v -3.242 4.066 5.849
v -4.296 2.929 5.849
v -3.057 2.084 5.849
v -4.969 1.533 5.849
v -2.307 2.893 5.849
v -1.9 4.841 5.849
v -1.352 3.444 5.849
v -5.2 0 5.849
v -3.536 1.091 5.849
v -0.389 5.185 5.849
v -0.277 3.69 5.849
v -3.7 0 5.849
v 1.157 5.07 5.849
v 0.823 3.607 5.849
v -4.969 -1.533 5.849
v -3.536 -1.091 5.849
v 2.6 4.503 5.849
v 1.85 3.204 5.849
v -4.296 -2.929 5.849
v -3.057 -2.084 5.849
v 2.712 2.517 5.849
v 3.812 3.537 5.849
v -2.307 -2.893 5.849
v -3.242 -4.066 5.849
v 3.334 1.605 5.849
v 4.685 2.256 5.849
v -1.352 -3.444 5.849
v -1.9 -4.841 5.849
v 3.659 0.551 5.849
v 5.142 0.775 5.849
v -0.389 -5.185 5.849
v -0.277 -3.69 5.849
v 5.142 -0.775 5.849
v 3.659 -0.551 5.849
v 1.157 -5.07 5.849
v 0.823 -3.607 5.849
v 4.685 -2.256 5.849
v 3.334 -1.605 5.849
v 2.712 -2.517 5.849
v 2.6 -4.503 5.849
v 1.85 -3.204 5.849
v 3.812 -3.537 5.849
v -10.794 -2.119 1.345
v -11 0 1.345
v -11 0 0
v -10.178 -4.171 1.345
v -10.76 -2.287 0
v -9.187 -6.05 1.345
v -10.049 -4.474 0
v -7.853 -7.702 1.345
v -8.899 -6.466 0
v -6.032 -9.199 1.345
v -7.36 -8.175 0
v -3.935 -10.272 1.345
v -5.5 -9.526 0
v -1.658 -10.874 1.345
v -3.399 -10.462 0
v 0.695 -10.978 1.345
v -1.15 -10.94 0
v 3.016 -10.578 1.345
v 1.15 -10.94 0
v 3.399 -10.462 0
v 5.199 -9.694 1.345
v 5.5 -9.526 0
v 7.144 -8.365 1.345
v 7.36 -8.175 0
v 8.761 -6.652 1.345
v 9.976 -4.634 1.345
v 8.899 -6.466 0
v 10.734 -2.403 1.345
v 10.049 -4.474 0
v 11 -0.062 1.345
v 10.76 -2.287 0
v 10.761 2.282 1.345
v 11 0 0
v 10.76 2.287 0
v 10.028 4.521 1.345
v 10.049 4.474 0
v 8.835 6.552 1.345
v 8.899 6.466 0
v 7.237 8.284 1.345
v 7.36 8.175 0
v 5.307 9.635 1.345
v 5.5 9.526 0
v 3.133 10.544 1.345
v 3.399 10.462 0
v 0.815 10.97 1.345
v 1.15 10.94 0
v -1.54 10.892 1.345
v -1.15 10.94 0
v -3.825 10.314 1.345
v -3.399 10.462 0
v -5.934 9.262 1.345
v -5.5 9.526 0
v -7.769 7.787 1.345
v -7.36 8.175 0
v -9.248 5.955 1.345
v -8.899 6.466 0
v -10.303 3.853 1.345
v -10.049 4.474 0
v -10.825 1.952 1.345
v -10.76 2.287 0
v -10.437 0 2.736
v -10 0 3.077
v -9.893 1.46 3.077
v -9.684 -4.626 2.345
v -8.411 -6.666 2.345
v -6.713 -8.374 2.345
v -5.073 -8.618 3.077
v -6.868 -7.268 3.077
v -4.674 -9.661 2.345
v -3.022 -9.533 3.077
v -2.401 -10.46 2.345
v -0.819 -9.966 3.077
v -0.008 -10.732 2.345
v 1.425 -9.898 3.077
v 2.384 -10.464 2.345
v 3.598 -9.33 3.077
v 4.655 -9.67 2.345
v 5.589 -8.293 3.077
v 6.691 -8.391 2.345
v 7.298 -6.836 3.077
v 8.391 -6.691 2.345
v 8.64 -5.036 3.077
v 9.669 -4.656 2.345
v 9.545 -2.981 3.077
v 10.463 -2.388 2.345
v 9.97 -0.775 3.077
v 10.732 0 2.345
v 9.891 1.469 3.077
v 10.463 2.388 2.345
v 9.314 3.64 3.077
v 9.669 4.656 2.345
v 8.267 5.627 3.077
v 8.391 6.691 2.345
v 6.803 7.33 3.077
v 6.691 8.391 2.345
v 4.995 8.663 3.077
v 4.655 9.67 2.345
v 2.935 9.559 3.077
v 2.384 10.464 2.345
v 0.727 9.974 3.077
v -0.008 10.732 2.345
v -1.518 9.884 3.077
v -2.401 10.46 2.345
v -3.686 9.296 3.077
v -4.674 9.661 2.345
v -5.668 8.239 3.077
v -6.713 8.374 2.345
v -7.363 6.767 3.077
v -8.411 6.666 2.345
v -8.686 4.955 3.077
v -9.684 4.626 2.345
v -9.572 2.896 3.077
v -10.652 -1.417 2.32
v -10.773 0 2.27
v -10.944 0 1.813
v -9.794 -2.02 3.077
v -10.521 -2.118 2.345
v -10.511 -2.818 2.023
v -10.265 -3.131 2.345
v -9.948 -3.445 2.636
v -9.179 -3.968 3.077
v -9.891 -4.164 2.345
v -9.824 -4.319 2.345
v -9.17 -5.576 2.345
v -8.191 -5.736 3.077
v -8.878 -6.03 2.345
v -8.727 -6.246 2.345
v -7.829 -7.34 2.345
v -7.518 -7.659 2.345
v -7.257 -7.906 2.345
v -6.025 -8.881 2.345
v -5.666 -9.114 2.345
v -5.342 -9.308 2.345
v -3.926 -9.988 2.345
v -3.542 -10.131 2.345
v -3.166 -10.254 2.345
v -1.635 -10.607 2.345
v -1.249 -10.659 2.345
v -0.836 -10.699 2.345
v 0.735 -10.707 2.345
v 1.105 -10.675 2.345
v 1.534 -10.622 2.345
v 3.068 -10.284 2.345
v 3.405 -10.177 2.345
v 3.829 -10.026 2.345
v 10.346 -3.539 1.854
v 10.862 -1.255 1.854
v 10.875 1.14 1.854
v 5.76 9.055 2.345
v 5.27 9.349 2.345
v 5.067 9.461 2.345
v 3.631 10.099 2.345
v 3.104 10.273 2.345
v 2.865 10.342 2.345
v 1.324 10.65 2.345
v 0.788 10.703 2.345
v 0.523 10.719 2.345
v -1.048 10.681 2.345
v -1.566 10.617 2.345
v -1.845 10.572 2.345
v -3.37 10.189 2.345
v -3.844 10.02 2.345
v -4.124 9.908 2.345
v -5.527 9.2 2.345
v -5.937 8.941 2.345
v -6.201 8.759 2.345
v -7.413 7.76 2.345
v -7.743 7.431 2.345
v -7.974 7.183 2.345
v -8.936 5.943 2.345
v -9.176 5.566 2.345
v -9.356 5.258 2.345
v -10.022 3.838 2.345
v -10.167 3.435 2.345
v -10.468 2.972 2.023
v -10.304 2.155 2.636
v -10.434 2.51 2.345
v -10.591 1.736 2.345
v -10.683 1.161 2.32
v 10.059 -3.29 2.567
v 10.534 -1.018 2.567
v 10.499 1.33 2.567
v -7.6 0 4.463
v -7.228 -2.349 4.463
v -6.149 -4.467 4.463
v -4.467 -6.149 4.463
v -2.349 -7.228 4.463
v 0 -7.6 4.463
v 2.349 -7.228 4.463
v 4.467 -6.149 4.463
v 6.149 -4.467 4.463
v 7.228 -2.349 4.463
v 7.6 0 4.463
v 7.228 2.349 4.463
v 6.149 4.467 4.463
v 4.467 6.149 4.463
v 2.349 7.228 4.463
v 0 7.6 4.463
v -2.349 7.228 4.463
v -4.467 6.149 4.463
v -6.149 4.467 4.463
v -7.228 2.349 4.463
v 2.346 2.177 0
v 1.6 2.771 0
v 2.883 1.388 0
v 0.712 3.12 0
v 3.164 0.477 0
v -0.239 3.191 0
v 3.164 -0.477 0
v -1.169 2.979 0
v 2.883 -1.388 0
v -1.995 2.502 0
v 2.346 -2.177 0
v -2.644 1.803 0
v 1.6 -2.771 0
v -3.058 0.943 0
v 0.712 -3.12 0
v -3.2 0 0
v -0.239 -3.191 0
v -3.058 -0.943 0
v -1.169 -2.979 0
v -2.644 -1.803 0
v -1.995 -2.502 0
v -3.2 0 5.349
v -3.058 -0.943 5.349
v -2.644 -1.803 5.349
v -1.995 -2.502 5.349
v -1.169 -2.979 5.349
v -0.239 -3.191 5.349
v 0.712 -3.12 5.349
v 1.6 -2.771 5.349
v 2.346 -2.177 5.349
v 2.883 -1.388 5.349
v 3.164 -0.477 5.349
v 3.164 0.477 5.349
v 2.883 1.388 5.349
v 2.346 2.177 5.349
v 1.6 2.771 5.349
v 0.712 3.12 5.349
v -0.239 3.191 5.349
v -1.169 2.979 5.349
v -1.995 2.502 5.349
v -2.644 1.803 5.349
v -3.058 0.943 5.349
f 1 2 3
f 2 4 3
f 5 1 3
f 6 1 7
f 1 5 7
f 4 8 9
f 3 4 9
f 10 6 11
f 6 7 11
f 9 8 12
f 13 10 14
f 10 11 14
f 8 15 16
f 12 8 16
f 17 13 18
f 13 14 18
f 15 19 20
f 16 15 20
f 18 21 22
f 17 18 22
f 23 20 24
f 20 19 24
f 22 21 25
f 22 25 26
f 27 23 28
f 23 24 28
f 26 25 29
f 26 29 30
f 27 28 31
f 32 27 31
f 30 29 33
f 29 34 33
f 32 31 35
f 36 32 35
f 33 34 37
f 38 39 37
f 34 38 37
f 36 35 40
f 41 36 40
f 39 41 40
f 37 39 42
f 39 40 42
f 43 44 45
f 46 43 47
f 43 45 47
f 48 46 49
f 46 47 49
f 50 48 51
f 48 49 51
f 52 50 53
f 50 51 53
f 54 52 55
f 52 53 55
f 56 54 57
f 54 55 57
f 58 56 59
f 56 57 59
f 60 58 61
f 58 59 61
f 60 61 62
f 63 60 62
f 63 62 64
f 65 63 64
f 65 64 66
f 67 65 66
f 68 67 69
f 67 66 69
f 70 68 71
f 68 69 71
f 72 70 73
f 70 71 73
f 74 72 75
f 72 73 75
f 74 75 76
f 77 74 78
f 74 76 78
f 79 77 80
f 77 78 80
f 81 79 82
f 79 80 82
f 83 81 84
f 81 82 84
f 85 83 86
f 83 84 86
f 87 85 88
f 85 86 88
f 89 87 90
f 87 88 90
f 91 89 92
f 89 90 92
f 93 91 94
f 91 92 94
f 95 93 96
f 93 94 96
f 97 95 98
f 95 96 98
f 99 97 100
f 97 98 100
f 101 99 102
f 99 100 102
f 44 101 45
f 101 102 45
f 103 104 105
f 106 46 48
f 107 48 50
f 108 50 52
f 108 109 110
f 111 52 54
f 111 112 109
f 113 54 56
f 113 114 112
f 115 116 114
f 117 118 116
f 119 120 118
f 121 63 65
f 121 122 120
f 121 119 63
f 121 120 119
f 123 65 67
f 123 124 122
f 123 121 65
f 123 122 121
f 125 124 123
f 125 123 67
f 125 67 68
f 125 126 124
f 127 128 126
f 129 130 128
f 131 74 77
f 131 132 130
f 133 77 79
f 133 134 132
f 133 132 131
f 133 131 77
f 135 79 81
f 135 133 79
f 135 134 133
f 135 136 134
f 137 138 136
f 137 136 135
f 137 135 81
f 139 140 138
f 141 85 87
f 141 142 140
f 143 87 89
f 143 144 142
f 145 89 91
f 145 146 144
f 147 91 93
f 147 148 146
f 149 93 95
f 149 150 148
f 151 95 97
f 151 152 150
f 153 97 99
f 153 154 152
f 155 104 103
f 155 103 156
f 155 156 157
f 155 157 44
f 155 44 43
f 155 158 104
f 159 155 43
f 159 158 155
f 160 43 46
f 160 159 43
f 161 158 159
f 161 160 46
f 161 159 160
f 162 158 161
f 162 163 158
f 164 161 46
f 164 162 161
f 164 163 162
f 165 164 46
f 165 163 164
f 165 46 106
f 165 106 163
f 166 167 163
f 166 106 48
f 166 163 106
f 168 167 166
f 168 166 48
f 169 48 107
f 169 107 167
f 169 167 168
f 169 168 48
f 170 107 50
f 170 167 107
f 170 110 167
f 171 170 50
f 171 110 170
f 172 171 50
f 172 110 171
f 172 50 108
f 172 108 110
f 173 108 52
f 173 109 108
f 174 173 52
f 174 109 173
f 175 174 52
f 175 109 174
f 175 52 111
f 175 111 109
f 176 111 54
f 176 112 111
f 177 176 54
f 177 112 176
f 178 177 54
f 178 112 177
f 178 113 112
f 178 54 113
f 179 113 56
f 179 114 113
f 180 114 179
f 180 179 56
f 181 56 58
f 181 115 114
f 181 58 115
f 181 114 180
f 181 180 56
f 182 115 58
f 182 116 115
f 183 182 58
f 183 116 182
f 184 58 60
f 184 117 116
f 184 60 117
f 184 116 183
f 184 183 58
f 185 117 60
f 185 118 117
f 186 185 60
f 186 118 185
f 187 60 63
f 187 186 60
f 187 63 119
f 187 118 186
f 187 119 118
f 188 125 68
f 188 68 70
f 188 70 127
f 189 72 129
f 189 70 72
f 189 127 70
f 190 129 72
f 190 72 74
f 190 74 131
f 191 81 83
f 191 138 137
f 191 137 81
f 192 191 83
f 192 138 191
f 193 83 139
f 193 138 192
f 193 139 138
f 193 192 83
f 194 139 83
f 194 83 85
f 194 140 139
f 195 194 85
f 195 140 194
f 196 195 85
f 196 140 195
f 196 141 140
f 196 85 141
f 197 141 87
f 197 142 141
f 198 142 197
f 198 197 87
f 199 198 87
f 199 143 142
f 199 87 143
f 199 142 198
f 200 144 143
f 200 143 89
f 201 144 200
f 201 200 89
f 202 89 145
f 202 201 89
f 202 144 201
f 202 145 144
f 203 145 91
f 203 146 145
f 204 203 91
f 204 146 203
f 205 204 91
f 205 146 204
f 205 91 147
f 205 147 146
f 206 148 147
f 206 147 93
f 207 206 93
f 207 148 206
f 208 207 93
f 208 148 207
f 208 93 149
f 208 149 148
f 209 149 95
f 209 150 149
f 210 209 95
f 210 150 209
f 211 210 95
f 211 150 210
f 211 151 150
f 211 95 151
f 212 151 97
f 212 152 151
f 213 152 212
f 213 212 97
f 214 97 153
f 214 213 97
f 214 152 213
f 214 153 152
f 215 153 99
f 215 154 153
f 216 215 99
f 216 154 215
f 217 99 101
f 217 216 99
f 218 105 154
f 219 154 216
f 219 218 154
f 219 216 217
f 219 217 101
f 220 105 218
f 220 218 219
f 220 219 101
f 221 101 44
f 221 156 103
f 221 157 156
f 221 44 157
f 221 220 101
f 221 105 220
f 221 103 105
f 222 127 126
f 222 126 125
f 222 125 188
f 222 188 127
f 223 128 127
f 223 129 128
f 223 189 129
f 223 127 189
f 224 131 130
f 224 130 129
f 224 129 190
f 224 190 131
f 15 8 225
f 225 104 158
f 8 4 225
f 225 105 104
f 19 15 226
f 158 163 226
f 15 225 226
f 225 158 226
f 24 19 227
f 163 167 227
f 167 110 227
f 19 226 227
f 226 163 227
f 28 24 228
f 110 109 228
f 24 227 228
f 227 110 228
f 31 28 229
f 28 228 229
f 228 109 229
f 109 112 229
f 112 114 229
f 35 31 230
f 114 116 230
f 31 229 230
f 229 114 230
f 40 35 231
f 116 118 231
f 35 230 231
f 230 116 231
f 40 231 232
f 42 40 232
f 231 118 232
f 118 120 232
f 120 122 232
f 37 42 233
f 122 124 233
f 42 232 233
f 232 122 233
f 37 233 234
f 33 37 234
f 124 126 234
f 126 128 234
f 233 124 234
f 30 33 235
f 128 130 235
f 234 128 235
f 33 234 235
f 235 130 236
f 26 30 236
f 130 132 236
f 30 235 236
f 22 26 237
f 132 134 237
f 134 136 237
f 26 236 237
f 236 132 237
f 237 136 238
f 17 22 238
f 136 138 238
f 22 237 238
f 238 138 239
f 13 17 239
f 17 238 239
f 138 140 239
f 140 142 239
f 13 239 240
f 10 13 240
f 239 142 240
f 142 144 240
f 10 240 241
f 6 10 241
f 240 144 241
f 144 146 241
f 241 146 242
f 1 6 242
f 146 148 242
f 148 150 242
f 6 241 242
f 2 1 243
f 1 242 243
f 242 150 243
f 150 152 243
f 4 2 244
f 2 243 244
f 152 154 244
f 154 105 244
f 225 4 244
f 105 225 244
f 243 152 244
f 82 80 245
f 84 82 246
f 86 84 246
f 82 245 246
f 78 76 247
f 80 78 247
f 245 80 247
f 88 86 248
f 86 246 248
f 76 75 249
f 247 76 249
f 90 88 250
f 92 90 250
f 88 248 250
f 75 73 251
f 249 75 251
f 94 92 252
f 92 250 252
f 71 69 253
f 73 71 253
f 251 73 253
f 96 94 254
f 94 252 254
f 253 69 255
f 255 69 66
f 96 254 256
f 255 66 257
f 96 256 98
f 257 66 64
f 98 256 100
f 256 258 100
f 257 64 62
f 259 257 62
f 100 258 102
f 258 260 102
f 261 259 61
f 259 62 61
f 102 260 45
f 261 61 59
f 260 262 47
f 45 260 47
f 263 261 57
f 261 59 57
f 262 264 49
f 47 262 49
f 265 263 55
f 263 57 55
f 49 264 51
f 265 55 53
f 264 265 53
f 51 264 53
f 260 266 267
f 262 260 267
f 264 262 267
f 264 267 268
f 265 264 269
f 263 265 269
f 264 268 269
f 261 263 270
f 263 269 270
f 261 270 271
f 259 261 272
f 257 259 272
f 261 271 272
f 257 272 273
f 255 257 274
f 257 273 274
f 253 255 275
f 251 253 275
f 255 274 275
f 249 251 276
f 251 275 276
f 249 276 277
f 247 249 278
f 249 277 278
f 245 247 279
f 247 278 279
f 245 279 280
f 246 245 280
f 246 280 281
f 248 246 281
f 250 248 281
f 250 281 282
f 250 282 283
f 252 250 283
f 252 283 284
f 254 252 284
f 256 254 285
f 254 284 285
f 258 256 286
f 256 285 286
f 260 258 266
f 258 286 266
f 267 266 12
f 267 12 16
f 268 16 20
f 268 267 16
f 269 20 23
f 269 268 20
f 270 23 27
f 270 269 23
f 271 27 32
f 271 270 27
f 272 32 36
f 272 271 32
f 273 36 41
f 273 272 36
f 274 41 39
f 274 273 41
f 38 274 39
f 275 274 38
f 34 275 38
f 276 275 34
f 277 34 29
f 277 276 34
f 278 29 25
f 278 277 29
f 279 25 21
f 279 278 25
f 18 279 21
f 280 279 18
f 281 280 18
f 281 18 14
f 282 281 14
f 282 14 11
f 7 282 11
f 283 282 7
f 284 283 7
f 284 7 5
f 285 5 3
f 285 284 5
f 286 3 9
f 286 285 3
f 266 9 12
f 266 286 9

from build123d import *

# Parameters (mm, degrees)
F2_R    = 2
F3_SIZE = 0.5


with BuildPart() as f1:
    # F0 (on Front) → F1 (revolve)
    with BuildSketch(Plane.XZ):
        Polygon((-11, 0), (-3.2, 0), (-3.2, 5.848632), (-5.2, 5.848632), (-11, 2.5), align=None)
    revolve(axis=Axis((0, 0, 13.586091), (0, 0, 1)))

    # F2
    f2_edges = [f1.edges().sort_by_distance(p)[0] for p in [
        (11, 0, 2.5),
    ]]
    fillet(f2_edges, radius=F2_R)

    # F3
    f3_edges = [f1.edges().sort_by_distance(p)[0] for p in [
        (3.2, 0, 5.848632),
    ]]
    chamfer(f3_edges, length=F3_SIZE)


solid = f1.part
